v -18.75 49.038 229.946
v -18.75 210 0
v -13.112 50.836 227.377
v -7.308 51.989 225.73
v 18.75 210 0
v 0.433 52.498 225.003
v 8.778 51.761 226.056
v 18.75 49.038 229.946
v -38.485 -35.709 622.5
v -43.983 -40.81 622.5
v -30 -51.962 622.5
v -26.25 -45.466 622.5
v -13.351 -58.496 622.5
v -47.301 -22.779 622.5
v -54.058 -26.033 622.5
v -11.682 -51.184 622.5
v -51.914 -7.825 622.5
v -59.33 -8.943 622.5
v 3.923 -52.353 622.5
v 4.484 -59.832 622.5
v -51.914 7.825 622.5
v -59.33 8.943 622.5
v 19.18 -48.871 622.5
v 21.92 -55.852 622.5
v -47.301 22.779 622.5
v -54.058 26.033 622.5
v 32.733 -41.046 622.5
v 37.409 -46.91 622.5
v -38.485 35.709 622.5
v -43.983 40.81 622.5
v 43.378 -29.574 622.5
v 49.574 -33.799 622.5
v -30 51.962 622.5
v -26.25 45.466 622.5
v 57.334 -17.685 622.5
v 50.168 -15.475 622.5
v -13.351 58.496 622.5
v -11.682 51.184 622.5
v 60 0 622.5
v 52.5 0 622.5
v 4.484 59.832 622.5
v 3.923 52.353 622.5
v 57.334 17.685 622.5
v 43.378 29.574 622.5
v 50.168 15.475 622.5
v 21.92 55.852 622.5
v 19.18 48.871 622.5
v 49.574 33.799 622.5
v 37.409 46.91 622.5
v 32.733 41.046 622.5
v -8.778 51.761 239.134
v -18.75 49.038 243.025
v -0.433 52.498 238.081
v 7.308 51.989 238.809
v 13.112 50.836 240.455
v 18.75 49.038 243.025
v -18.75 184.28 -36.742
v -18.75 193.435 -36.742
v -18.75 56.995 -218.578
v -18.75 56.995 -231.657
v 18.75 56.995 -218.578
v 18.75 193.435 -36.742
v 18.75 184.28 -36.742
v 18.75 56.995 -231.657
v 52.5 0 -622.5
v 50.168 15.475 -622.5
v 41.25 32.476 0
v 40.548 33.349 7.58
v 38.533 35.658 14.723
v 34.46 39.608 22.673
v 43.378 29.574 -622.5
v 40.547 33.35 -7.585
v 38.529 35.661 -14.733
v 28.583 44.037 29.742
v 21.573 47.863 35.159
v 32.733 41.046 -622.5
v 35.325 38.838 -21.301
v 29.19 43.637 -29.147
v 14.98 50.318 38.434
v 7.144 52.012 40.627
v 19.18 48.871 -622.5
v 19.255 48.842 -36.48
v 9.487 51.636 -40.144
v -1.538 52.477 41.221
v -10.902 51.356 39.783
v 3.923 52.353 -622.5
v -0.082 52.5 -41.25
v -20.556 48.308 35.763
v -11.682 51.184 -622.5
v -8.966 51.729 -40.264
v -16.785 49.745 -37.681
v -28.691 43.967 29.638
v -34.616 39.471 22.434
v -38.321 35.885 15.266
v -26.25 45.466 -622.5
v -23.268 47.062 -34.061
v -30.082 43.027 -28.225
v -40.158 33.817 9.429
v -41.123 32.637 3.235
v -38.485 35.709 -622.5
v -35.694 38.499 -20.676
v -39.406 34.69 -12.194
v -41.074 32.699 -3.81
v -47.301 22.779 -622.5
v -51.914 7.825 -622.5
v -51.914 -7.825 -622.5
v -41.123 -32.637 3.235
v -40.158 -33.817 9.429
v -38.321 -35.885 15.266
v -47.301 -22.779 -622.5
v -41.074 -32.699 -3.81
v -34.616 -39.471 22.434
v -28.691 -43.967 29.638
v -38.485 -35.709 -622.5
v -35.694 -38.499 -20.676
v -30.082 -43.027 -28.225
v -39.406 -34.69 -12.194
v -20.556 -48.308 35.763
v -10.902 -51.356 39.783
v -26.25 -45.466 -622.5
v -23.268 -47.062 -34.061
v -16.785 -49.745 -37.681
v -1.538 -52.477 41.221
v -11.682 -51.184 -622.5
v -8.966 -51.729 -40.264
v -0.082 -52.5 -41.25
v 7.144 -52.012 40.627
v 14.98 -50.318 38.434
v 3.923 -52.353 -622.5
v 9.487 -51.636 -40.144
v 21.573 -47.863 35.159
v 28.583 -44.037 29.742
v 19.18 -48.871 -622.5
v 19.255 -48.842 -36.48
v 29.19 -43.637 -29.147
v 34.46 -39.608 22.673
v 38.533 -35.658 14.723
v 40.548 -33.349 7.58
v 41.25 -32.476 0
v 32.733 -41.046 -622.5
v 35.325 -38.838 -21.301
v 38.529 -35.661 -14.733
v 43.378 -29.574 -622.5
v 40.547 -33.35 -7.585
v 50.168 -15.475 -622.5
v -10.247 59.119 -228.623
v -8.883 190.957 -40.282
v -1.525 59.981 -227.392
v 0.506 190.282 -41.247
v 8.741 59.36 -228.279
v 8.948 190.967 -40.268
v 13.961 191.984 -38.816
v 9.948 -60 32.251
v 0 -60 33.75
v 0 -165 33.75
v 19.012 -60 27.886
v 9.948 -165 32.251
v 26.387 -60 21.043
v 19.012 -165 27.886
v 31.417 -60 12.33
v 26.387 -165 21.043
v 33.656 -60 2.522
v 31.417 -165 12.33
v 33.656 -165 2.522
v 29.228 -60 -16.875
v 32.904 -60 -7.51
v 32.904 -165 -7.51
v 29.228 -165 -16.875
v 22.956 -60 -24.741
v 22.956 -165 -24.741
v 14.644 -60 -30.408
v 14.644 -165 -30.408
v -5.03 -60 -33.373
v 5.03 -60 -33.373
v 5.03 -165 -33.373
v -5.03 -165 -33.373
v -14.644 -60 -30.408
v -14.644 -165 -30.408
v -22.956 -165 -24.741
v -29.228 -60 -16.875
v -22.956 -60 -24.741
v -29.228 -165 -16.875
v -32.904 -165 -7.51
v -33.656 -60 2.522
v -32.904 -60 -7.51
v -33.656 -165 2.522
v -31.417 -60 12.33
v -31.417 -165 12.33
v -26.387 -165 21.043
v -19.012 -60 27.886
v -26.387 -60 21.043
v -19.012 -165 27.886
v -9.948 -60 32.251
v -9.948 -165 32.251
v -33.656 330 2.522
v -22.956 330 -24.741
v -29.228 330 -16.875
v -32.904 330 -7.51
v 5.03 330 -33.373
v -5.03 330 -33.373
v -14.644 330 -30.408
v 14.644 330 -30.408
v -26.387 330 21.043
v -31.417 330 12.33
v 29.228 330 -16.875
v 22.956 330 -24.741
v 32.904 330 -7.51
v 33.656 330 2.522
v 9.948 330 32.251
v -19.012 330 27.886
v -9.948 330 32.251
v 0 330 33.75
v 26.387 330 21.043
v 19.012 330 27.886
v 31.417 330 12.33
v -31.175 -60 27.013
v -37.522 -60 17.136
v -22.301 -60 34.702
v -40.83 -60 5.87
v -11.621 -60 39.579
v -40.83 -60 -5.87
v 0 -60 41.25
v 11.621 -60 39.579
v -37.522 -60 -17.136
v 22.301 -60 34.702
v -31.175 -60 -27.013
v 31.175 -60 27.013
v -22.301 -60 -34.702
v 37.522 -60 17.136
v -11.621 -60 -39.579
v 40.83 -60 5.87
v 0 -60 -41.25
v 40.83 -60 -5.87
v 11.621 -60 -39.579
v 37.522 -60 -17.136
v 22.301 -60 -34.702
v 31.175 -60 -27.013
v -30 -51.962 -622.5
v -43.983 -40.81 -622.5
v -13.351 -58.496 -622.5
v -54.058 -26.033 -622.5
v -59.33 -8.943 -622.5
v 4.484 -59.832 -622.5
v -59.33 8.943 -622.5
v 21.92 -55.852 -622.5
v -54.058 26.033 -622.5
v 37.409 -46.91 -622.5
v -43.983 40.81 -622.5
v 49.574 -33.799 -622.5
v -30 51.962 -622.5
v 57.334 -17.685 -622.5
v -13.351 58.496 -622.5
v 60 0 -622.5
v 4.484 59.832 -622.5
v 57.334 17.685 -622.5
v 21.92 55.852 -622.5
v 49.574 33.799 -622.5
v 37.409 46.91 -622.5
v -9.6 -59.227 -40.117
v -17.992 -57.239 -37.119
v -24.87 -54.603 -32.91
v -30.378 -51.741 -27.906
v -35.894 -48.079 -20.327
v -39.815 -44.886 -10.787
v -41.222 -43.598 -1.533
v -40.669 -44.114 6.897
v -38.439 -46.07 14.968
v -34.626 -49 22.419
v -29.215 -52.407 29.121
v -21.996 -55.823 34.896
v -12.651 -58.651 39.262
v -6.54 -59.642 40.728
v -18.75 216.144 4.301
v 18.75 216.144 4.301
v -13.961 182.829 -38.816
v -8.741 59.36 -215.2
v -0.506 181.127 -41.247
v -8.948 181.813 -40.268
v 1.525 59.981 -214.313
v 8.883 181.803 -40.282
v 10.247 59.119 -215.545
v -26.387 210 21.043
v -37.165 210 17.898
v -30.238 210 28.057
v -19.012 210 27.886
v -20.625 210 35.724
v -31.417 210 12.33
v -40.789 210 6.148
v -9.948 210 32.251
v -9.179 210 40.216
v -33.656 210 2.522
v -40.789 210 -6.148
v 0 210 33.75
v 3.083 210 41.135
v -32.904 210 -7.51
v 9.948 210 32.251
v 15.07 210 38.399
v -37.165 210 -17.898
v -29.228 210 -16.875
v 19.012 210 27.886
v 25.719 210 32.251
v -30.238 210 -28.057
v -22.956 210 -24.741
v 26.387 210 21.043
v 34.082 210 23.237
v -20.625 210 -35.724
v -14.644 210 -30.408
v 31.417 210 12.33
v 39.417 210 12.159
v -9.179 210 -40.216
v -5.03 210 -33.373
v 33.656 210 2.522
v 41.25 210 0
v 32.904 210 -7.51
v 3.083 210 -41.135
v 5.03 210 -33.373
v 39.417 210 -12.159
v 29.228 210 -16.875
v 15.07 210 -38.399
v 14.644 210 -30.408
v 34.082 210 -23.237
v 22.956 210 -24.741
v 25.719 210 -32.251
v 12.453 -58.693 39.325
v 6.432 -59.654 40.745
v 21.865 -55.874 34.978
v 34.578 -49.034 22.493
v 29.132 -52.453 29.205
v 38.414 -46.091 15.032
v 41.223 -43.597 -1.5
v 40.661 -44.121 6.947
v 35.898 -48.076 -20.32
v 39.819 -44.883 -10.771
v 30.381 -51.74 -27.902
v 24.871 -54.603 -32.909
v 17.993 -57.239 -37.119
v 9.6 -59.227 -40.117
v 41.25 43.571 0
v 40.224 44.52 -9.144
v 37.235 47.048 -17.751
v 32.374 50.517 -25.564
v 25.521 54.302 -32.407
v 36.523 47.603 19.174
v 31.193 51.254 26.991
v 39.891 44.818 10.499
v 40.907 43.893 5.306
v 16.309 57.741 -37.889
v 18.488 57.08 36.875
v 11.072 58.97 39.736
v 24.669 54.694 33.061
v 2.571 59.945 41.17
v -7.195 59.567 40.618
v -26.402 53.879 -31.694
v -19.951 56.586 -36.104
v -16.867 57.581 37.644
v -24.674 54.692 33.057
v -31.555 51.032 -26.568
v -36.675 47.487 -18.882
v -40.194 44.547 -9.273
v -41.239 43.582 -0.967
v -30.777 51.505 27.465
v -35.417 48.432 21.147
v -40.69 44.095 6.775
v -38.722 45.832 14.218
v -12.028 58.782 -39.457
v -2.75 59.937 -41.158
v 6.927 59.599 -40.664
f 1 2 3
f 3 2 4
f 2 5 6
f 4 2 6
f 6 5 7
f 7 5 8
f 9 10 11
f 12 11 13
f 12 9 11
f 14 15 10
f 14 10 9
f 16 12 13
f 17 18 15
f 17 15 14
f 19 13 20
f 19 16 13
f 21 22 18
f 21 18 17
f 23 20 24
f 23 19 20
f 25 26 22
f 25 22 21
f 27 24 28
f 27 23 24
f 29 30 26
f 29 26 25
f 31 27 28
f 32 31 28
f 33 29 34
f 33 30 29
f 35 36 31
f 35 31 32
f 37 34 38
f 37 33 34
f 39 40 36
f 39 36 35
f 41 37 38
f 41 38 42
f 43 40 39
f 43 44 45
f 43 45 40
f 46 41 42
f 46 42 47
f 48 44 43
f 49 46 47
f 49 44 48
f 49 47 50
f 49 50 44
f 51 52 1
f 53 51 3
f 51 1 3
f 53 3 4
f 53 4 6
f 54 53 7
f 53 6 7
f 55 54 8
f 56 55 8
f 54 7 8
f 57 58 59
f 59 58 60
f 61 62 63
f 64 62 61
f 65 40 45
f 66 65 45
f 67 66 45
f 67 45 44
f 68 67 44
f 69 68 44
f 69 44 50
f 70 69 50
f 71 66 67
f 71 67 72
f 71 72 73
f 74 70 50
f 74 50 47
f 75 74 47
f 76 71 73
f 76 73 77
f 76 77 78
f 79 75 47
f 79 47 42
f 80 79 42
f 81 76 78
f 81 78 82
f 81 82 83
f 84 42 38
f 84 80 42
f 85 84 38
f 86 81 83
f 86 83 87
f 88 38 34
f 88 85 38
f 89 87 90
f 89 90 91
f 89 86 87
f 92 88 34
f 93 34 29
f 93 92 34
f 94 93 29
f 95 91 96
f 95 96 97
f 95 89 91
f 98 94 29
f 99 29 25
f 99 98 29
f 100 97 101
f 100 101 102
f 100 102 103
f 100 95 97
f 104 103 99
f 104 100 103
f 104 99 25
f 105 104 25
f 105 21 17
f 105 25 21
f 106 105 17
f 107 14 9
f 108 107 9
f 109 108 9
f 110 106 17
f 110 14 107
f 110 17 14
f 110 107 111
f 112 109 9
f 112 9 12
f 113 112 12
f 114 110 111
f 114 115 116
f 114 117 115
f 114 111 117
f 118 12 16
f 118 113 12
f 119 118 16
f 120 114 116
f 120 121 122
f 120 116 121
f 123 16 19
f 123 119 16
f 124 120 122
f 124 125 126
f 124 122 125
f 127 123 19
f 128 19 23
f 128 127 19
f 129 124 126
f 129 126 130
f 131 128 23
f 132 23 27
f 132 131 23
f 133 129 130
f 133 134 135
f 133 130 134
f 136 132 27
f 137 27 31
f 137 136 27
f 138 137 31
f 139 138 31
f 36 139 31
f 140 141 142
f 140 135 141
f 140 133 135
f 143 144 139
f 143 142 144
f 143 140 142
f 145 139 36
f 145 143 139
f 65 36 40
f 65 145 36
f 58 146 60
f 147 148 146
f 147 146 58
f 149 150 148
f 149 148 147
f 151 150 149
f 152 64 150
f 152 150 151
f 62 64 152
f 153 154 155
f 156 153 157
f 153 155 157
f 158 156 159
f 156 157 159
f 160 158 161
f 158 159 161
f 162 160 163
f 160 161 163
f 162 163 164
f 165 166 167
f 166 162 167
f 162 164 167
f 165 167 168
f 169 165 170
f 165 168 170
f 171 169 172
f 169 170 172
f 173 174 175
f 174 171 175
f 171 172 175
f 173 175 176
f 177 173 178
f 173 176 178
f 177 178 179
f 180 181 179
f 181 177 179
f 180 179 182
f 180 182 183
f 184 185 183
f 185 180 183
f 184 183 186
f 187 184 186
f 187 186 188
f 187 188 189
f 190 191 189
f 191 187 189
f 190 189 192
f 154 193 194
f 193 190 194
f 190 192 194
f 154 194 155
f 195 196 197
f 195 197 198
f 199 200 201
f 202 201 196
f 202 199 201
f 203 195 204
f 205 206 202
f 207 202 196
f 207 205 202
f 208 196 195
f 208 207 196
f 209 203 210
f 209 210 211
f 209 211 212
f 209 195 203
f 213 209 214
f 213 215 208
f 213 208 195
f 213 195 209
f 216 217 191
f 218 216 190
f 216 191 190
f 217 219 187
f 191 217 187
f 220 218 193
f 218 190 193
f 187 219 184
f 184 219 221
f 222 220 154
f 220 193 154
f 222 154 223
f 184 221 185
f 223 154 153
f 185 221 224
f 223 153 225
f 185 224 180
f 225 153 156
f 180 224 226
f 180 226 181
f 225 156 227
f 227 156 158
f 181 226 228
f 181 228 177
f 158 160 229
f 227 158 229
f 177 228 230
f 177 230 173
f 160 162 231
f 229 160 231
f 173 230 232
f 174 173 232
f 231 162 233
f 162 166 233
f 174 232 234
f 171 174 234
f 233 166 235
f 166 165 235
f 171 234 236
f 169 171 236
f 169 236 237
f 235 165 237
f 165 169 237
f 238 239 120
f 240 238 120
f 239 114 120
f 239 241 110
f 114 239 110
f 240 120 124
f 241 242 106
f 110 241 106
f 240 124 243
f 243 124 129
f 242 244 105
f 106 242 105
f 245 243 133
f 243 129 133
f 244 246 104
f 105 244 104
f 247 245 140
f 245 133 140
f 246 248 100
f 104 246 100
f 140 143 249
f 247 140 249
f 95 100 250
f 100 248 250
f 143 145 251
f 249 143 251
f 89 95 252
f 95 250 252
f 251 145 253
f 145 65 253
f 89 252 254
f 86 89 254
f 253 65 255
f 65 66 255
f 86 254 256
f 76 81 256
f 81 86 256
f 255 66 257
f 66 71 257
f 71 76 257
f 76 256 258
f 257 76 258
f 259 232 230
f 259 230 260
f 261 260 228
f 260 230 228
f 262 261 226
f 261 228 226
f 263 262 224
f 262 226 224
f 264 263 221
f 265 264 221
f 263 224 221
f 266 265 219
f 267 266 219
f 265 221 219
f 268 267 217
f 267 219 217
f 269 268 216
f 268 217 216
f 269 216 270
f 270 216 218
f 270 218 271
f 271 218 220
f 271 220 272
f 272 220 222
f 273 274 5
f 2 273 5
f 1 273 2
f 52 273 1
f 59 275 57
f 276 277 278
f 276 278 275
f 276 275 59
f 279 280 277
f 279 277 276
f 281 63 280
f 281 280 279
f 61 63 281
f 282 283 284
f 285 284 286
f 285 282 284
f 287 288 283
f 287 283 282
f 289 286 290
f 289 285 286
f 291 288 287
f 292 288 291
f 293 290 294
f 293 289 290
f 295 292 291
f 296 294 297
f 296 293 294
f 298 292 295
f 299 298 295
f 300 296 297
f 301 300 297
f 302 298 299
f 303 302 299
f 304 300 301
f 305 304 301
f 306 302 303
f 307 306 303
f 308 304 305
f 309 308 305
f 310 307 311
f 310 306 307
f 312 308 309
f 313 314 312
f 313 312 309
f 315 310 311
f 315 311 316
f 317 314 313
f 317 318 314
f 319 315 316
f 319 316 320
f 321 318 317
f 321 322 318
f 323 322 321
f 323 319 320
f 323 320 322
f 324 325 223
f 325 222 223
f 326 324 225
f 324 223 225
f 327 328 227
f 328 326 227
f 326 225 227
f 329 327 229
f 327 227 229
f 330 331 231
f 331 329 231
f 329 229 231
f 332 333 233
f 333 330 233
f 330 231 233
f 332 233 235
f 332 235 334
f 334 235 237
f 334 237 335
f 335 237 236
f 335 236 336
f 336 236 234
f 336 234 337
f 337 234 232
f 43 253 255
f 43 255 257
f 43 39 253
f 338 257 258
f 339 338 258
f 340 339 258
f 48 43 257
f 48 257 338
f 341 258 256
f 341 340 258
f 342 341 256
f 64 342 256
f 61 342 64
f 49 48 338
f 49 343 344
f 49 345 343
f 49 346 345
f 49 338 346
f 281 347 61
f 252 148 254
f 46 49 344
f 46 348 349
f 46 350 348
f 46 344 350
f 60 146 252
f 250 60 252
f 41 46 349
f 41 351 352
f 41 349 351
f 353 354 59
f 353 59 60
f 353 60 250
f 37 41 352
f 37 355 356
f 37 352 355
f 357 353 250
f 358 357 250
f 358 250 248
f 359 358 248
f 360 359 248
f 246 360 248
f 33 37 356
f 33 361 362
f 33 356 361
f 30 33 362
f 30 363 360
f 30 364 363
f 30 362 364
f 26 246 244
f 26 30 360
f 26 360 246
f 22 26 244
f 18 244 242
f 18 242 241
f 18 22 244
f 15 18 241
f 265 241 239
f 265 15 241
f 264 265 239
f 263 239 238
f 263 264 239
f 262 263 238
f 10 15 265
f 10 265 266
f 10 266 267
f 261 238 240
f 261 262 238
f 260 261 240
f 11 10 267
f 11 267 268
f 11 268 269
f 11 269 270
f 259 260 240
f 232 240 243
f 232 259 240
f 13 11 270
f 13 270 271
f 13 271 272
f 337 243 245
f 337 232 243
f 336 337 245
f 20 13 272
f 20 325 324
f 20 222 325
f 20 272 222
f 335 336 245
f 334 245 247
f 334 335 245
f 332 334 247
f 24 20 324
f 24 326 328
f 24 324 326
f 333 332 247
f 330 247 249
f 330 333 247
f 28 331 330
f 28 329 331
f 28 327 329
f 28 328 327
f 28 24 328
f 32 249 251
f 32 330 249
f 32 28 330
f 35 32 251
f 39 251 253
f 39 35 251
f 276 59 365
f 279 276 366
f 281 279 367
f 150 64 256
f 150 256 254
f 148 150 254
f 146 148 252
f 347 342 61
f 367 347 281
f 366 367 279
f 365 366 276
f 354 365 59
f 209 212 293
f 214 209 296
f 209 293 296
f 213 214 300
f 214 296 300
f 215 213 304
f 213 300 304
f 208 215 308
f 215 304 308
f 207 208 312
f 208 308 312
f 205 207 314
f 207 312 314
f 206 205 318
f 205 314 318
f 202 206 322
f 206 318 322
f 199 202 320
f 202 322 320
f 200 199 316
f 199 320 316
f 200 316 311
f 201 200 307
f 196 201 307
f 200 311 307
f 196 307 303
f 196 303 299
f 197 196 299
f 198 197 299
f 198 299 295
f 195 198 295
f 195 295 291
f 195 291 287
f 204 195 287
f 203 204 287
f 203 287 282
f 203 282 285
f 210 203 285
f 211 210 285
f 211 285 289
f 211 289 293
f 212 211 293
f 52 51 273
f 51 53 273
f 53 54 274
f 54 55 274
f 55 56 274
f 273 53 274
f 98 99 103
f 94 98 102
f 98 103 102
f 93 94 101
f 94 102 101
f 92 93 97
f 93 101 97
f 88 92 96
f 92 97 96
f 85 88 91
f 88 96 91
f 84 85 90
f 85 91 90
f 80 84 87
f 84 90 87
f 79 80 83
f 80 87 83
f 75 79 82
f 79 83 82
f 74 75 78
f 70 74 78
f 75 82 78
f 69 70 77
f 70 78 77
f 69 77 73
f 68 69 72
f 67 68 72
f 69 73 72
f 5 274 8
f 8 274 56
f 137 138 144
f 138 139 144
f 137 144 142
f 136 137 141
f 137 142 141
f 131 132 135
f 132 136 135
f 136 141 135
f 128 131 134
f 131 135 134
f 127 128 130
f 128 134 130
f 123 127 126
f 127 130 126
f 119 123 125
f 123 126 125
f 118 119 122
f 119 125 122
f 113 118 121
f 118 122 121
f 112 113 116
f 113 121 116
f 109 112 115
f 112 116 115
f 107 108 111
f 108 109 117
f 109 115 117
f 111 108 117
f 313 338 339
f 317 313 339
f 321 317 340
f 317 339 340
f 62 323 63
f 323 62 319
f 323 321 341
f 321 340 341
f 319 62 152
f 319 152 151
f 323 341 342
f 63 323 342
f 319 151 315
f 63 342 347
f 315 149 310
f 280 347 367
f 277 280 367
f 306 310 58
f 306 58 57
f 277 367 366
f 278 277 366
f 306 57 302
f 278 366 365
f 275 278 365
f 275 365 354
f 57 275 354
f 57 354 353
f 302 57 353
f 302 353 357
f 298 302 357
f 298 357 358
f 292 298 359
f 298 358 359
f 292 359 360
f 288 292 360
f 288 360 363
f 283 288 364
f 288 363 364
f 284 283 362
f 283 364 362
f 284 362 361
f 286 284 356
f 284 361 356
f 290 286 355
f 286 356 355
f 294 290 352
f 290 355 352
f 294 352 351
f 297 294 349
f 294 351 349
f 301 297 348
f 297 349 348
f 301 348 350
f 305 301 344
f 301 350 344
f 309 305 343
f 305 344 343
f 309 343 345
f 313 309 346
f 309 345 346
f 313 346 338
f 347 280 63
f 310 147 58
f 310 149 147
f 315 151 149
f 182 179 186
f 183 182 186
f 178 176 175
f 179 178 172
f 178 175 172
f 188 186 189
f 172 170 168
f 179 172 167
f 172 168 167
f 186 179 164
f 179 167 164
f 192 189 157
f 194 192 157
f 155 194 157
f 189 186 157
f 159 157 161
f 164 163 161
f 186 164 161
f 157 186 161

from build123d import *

# Parameters (mm, degrees)
SKETCH1_R                = 60
SKETCH1_R_2              = 52.5
EXTRUDE_THIN1_DEPTH      = 622.5
EXTRUDE_THIN2_DEPTH      = 210
EXTRUDE_THIN2_DEPTH_BACK = 60
SKETCH2_R                = 41.25
SKETCH2_R_2              = 33.75
BOSS_EXTRUDE1_DEPTH      = 120
BOSS_EXTRUDE1_DEPTH_BACK = 375
SKETCH3_R                = 33.75
EXTRUDE_THIN3_DEPTH      = 18.75
SKETCH5_R                = 52.5
CUT_EXTRUDE1_DEPTH       = 1290.389390472


with BuildPart() as part:
    # Sketch1 → Extrude-Thin1 (new, symmetric)
    with BuildSketch(Plane.XY):
        Circle(SKETCH1_R)
        Circle(SKETCH1_R_2, mode=Mode.SUBTRACT)
    extrude(amount=EXTRUDE_THIN1_DEPTH, both=True)

    # Sketch2 → Extrude-Thin2 (add, two sides: drawn at the far end of the back side and taken through both)
    with BuildSketch(Plane(origin=(0, 0, 0), x_dir=(1, 0, 0), z_dir=(0, 1, 0)).offset(-EXTRUDE_THIN2_DEPTH_BACK)):
        Circle(SKETCH2_R)
        Circle(SKETCH2_R_2, mode=Mode.SUBTRACT)
    extrude(amount=EXTRUDE_THIN2_DEPTH + EXTRUDE_THIN2_DEPTH_BACK)

    # Sketch3 → Boss-Extrude1 (add, two sides: drawn at the far end of the back side and taken through both)
    with BuildSketch(Plane(origin=(0, 210, 0), x_dir=(1, 0, 0), z_dir=(0, 1, 0)).offset(-BOSS_EXTRUDE1_DEPTH_BACK)):
        with Locations(Location((0, 0, 0), (0, 0, 270))):
            Circle(SKETCH3_R)
    extrude(amount=BOSS_EXTRUDE1_DEPTH + BOSS_EXTRUDE1_DEPTH_BACK)


with BuildPart() as body_2:
    # Sketch4 → Extrude-Thin3 (new, symmetric)
    with BuildSketch(Plane(origin=(0, 0, 0), x_dir=(0, 0, -1), z_dir=(1, 0, 0))):
        Polygon((0, 210), (-300, 0), (-304.300967583, 6.144239404), (-4.300967583, 216.144239404), align=None)
    extrude_thin3 = extrude(amount=EXTRUDE_THIN3_DEPTH, both=True)


with BuildPart() as part_1:
    add(part.part)

    # Mirror2: Extrude-Thin3 across plane
    add(extrude_thin3.mirror(Plane.XY))


with BuildPart() as cut_extrude1_tool:
    # Sketch5 → Cut-Extrude1 (new, through all)
    with BuildSketch(Plane(origin=(0, 0, -622.5), x_dir=(-1, 0, 0), z_dir=(0, 0, -1))):
        Circle(SKETCH5_R)
    extrude(amount=-CUT_EXTRUDE1_DEPTH)


with BuildPart() as part_2:
    add(part_1.part)

    # Cut-Extrude1: cut by cut_extrude1_tool
    add(cut_extrude1_tool.part, mode=Mode.SUBTRACT)


with BuildPart() as body_2_1:
    add(body_2.part)

    # Cut-Extrude1: cut by cut_extrude1_tool
    add(cut_extrude1_tool.part, mode=Mode.SUBTRACT)


solid = Compound([part_2.part, body_2_1.part])
